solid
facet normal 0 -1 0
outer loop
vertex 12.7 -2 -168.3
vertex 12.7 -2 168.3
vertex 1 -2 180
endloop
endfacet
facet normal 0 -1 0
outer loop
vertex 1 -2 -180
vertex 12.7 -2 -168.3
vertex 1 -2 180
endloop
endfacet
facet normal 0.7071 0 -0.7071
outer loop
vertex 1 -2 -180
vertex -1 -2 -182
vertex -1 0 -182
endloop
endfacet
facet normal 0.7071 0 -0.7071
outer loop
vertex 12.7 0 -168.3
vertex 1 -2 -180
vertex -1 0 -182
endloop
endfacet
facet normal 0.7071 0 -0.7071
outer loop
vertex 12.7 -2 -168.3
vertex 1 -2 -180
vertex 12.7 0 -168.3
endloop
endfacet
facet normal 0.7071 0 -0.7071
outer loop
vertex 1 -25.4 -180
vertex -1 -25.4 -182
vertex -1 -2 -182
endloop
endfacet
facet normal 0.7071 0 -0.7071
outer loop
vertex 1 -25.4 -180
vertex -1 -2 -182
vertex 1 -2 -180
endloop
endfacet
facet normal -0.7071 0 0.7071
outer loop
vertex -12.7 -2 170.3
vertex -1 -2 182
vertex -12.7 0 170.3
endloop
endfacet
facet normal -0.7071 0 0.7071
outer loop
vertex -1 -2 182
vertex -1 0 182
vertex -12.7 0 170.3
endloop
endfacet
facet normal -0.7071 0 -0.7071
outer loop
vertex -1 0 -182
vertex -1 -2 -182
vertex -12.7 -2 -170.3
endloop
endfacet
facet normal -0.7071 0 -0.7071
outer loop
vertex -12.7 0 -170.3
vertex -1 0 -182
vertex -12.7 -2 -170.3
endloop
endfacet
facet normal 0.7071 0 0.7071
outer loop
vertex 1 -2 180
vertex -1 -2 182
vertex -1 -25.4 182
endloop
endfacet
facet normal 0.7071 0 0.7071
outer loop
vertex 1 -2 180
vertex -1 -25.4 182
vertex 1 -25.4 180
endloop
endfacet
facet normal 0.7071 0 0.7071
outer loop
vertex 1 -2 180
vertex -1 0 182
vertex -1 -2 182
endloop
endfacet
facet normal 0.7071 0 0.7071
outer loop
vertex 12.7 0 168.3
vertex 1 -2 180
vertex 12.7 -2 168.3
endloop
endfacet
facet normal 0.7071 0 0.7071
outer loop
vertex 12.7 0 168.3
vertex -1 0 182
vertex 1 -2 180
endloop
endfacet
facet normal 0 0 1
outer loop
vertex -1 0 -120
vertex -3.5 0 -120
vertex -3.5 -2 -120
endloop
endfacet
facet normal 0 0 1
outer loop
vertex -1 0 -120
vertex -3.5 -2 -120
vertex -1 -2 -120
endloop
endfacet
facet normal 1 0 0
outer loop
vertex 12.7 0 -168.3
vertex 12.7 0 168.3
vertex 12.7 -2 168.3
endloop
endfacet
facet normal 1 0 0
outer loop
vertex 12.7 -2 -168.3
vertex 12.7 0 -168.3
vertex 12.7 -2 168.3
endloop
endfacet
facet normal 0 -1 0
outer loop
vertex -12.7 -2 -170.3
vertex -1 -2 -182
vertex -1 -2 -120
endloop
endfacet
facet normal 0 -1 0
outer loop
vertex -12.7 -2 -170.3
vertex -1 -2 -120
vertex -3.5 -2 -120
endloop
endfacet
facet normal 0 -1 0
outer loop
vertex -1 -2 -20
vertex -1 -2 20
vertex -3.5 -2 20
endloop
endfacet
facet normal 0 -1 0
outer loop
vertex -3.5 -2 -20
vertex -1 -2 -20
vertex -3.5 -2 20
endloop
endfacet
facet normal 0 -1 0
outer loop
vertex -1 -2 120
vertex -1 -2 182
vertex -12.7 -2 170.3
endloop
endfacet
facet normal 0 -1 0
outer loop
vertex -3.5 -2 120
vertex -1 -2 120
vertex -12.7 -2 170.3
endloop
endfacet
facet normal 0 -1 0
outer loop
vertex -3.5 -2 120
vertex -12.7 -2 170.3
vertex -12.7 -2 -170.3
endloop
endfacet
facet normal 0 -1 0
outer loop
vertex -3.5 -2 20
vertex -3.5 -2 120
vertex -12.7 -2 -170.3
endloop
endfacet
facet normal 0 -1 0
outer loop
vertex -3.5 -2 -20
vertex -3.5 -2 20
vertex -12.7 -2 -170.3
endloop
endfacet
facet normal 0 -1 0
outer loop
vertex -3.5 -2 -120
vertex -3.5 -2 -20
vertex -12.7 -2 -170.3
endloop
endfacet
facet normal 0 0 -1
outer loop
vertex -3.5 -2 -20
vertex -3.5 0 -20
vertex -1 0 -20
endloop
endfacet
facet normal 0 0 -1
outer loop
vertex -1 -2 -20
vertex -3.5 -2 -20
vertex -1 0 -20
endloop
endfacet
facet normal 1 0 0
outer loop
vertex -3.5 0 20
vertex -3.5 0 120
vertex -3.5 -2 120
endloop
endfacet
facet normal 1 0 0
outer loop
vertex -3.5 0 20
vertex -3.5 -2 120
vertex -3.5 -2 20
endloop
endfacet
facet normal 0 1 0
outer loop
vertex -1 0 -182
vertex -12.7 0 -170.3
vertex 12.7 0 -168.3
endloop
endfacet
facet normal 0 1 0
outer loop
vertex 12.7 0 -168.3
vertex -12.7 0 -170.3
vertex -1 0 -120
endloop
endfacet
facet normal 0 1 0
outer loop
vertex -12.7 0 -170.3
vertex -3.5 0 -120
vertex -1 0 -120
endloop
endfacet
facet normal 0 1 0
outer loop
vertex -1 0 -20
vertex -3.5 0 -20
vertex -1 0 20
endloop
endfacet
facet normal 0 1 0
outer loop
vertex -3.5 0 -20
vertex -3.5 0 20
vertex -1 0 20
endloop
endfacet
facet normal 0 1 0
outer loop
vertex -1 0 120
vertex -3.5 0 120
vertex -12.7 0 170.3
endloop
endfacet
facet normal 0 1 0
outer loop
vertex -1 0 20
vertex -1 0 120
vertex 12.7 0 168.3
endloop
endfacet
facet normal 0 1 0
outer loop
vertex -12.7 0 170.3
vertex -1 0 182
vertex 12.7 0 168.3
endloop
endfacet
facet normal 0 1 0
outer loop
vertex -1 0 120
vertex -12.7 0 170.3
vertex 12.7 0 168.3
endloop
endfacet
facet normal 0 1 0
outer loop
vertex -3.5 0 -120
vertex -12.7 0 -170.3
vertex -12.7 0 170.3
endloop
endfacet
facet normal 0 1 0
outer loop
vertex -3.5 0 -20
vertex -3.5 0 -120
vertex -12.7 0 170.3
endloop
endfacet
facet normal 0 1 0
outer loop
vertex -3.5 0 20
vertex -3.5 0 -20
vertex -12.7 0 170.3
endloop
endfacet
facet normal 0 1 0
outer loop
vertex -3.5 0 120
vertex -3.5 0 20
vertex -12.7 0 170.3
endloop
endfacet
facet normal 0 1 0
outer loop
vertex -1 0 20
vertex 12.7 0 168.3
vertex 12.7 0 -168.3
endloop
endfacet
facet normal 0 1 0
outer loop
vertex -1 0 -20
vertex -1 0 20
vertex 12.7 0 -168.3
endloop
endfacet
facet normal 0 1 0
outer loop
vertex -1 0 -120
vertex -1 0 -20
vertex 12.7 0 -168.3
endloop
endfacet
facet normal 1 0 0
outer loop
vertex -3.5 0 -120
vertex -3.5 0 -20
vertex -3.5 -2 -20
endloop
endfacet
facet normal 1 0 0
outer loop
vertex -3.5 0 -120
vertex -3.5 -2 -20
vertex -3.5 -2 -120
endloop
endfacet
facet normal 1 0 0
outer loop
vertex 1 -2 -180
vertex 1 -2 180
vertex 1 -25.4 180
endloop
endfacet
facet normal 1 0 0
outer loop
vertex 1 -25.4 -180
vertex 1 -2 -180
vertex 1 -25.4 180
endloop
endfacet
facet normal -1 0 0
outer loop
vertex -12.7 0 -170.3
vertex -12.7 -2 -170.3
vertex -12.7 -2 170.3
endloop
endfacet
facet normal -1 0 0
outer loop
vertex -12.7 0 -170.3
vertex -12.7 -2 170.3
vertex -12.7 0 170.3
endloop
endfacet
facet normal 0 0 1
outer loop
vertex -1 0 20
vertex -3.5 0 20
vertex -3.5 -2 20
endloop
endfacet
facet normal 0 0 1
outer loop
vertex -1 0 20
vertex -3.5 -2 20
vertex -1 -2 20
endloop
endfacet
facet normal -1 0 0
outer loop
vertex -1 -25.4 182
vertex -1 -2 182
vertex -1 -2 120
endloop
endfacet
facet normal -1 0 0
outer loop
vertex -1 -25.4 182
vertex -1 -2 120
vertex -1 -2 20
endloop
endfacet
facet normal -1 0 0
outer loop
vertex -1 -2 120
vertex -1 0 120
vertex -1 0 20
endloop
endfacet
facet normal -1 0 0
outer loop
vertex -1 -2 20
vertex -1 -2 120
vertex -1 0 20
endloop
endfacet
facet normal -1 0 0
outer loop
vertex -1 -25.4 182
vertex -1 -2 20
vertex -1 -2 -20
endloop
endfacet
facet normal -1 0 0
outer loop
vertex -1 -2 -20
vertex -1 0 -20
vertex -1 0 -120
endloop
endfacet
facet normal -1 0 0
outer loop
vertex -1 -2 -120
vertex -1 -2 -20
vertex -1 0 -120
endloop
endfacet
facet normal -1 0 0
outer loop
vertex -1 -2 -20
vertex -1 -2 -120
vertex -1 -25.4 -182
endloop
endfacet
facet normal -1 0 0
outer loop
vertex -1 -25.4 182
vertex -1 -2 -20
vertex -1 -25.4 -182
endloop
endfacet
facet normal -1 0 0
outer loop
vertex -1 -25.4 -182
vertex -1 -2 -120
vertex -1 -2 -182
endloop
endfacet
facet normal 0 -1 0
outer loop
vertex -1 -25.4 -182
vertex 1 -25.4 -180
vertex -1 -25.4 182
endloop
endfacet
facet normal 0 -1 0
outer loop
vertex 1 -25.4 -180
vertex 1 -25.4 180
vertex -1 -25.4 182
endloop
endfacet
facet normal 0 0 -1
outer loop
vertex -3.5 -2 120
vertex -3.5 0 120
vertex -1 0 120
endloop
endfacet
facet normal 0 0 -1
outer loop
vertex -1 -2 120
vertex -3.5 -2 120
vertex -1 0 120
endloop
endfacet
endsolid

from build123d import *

# Parameters (mm, degrees)
RESSALTO_EXTRUS_O1_DEPTH = 182
CORTE_EXTRUS_O1_DEPTH    = 50
ESBO_O3_W                = 2.5
ESBO_O3_H                = 100
CORTE_EXTRUS_O2_DEPTH    = 185.202198684
CORTE_EXTRUS_O3_DEPTH    = 50


with BuildPart() as part:
    # Esboço1 → Ressalto-extrusão1 (new, symmetric)
    with BuildSketch(Plane.XY):
        Polygon((-12.7, 0), (12.7, 0), (12.7, -2), (1, -2), (1, -25.4), (-1, -25.4), (-1, -2), (-12.7, -2), align=None)
    extrude(amount=RESSALTO_EXTRUS_O1_DEPTH, both=True)

    # Esboço2 → Corte-extrusão1 (cut, symmetric)
    with BuildSketch(Plane(origin=(0, 0, 0), x_dir=(1, 0, 0), z_dir=(0, 1, 0))):
        Polygon((-1, 182), (12.7, 168.3), (12.7, 182), align=None)
        Polygon((-1, -182), (12.7, -168.3), (12.7, -182), align=None)
    extrude(amount=CORTE_EXTRUS_O1_DEPTH, both=True, mode=Mode.SUBTRACT)

    # Esboço3 → Corte-extrusão2 (cut, through all)
    with BuildSketch(Plane(origin=(0, 0, 0), x_dir=(1, 0, 0), z_dir=(0, 1, 0))):
        with Locations((-2.25, 70)):
            Rectangle(ESBO_O3_W, ESBO_O3_H)
        with Locations((-2.25, -70)):
            Rectangle(ESBO_O3_W, ESBO_O3_H)
    extrude(amount=-CORTE_EXTRUS_O2_DEPTH, mode=Mode.SUBTRACT)

    # Esboço4 → Corte-extrusão3 (cut, symmetric)
    with BuildSketch(Plane(origin=(0, 0, 0), x_dir=(1, 0, 0), z_dir=(0, 1, 0))):
        Polygon((-1, 182), (-12.7, 170.3), (-12.7, 182), align=None)
        Polygon((-1, -182), (-12.7, -170.3), (-12.7, -182), align=None)
    extrude(amount=CORTE_EXTRUS_O3_DEPTH, both=True, mode=Mode.SUBTRACT)


solid = part.part
